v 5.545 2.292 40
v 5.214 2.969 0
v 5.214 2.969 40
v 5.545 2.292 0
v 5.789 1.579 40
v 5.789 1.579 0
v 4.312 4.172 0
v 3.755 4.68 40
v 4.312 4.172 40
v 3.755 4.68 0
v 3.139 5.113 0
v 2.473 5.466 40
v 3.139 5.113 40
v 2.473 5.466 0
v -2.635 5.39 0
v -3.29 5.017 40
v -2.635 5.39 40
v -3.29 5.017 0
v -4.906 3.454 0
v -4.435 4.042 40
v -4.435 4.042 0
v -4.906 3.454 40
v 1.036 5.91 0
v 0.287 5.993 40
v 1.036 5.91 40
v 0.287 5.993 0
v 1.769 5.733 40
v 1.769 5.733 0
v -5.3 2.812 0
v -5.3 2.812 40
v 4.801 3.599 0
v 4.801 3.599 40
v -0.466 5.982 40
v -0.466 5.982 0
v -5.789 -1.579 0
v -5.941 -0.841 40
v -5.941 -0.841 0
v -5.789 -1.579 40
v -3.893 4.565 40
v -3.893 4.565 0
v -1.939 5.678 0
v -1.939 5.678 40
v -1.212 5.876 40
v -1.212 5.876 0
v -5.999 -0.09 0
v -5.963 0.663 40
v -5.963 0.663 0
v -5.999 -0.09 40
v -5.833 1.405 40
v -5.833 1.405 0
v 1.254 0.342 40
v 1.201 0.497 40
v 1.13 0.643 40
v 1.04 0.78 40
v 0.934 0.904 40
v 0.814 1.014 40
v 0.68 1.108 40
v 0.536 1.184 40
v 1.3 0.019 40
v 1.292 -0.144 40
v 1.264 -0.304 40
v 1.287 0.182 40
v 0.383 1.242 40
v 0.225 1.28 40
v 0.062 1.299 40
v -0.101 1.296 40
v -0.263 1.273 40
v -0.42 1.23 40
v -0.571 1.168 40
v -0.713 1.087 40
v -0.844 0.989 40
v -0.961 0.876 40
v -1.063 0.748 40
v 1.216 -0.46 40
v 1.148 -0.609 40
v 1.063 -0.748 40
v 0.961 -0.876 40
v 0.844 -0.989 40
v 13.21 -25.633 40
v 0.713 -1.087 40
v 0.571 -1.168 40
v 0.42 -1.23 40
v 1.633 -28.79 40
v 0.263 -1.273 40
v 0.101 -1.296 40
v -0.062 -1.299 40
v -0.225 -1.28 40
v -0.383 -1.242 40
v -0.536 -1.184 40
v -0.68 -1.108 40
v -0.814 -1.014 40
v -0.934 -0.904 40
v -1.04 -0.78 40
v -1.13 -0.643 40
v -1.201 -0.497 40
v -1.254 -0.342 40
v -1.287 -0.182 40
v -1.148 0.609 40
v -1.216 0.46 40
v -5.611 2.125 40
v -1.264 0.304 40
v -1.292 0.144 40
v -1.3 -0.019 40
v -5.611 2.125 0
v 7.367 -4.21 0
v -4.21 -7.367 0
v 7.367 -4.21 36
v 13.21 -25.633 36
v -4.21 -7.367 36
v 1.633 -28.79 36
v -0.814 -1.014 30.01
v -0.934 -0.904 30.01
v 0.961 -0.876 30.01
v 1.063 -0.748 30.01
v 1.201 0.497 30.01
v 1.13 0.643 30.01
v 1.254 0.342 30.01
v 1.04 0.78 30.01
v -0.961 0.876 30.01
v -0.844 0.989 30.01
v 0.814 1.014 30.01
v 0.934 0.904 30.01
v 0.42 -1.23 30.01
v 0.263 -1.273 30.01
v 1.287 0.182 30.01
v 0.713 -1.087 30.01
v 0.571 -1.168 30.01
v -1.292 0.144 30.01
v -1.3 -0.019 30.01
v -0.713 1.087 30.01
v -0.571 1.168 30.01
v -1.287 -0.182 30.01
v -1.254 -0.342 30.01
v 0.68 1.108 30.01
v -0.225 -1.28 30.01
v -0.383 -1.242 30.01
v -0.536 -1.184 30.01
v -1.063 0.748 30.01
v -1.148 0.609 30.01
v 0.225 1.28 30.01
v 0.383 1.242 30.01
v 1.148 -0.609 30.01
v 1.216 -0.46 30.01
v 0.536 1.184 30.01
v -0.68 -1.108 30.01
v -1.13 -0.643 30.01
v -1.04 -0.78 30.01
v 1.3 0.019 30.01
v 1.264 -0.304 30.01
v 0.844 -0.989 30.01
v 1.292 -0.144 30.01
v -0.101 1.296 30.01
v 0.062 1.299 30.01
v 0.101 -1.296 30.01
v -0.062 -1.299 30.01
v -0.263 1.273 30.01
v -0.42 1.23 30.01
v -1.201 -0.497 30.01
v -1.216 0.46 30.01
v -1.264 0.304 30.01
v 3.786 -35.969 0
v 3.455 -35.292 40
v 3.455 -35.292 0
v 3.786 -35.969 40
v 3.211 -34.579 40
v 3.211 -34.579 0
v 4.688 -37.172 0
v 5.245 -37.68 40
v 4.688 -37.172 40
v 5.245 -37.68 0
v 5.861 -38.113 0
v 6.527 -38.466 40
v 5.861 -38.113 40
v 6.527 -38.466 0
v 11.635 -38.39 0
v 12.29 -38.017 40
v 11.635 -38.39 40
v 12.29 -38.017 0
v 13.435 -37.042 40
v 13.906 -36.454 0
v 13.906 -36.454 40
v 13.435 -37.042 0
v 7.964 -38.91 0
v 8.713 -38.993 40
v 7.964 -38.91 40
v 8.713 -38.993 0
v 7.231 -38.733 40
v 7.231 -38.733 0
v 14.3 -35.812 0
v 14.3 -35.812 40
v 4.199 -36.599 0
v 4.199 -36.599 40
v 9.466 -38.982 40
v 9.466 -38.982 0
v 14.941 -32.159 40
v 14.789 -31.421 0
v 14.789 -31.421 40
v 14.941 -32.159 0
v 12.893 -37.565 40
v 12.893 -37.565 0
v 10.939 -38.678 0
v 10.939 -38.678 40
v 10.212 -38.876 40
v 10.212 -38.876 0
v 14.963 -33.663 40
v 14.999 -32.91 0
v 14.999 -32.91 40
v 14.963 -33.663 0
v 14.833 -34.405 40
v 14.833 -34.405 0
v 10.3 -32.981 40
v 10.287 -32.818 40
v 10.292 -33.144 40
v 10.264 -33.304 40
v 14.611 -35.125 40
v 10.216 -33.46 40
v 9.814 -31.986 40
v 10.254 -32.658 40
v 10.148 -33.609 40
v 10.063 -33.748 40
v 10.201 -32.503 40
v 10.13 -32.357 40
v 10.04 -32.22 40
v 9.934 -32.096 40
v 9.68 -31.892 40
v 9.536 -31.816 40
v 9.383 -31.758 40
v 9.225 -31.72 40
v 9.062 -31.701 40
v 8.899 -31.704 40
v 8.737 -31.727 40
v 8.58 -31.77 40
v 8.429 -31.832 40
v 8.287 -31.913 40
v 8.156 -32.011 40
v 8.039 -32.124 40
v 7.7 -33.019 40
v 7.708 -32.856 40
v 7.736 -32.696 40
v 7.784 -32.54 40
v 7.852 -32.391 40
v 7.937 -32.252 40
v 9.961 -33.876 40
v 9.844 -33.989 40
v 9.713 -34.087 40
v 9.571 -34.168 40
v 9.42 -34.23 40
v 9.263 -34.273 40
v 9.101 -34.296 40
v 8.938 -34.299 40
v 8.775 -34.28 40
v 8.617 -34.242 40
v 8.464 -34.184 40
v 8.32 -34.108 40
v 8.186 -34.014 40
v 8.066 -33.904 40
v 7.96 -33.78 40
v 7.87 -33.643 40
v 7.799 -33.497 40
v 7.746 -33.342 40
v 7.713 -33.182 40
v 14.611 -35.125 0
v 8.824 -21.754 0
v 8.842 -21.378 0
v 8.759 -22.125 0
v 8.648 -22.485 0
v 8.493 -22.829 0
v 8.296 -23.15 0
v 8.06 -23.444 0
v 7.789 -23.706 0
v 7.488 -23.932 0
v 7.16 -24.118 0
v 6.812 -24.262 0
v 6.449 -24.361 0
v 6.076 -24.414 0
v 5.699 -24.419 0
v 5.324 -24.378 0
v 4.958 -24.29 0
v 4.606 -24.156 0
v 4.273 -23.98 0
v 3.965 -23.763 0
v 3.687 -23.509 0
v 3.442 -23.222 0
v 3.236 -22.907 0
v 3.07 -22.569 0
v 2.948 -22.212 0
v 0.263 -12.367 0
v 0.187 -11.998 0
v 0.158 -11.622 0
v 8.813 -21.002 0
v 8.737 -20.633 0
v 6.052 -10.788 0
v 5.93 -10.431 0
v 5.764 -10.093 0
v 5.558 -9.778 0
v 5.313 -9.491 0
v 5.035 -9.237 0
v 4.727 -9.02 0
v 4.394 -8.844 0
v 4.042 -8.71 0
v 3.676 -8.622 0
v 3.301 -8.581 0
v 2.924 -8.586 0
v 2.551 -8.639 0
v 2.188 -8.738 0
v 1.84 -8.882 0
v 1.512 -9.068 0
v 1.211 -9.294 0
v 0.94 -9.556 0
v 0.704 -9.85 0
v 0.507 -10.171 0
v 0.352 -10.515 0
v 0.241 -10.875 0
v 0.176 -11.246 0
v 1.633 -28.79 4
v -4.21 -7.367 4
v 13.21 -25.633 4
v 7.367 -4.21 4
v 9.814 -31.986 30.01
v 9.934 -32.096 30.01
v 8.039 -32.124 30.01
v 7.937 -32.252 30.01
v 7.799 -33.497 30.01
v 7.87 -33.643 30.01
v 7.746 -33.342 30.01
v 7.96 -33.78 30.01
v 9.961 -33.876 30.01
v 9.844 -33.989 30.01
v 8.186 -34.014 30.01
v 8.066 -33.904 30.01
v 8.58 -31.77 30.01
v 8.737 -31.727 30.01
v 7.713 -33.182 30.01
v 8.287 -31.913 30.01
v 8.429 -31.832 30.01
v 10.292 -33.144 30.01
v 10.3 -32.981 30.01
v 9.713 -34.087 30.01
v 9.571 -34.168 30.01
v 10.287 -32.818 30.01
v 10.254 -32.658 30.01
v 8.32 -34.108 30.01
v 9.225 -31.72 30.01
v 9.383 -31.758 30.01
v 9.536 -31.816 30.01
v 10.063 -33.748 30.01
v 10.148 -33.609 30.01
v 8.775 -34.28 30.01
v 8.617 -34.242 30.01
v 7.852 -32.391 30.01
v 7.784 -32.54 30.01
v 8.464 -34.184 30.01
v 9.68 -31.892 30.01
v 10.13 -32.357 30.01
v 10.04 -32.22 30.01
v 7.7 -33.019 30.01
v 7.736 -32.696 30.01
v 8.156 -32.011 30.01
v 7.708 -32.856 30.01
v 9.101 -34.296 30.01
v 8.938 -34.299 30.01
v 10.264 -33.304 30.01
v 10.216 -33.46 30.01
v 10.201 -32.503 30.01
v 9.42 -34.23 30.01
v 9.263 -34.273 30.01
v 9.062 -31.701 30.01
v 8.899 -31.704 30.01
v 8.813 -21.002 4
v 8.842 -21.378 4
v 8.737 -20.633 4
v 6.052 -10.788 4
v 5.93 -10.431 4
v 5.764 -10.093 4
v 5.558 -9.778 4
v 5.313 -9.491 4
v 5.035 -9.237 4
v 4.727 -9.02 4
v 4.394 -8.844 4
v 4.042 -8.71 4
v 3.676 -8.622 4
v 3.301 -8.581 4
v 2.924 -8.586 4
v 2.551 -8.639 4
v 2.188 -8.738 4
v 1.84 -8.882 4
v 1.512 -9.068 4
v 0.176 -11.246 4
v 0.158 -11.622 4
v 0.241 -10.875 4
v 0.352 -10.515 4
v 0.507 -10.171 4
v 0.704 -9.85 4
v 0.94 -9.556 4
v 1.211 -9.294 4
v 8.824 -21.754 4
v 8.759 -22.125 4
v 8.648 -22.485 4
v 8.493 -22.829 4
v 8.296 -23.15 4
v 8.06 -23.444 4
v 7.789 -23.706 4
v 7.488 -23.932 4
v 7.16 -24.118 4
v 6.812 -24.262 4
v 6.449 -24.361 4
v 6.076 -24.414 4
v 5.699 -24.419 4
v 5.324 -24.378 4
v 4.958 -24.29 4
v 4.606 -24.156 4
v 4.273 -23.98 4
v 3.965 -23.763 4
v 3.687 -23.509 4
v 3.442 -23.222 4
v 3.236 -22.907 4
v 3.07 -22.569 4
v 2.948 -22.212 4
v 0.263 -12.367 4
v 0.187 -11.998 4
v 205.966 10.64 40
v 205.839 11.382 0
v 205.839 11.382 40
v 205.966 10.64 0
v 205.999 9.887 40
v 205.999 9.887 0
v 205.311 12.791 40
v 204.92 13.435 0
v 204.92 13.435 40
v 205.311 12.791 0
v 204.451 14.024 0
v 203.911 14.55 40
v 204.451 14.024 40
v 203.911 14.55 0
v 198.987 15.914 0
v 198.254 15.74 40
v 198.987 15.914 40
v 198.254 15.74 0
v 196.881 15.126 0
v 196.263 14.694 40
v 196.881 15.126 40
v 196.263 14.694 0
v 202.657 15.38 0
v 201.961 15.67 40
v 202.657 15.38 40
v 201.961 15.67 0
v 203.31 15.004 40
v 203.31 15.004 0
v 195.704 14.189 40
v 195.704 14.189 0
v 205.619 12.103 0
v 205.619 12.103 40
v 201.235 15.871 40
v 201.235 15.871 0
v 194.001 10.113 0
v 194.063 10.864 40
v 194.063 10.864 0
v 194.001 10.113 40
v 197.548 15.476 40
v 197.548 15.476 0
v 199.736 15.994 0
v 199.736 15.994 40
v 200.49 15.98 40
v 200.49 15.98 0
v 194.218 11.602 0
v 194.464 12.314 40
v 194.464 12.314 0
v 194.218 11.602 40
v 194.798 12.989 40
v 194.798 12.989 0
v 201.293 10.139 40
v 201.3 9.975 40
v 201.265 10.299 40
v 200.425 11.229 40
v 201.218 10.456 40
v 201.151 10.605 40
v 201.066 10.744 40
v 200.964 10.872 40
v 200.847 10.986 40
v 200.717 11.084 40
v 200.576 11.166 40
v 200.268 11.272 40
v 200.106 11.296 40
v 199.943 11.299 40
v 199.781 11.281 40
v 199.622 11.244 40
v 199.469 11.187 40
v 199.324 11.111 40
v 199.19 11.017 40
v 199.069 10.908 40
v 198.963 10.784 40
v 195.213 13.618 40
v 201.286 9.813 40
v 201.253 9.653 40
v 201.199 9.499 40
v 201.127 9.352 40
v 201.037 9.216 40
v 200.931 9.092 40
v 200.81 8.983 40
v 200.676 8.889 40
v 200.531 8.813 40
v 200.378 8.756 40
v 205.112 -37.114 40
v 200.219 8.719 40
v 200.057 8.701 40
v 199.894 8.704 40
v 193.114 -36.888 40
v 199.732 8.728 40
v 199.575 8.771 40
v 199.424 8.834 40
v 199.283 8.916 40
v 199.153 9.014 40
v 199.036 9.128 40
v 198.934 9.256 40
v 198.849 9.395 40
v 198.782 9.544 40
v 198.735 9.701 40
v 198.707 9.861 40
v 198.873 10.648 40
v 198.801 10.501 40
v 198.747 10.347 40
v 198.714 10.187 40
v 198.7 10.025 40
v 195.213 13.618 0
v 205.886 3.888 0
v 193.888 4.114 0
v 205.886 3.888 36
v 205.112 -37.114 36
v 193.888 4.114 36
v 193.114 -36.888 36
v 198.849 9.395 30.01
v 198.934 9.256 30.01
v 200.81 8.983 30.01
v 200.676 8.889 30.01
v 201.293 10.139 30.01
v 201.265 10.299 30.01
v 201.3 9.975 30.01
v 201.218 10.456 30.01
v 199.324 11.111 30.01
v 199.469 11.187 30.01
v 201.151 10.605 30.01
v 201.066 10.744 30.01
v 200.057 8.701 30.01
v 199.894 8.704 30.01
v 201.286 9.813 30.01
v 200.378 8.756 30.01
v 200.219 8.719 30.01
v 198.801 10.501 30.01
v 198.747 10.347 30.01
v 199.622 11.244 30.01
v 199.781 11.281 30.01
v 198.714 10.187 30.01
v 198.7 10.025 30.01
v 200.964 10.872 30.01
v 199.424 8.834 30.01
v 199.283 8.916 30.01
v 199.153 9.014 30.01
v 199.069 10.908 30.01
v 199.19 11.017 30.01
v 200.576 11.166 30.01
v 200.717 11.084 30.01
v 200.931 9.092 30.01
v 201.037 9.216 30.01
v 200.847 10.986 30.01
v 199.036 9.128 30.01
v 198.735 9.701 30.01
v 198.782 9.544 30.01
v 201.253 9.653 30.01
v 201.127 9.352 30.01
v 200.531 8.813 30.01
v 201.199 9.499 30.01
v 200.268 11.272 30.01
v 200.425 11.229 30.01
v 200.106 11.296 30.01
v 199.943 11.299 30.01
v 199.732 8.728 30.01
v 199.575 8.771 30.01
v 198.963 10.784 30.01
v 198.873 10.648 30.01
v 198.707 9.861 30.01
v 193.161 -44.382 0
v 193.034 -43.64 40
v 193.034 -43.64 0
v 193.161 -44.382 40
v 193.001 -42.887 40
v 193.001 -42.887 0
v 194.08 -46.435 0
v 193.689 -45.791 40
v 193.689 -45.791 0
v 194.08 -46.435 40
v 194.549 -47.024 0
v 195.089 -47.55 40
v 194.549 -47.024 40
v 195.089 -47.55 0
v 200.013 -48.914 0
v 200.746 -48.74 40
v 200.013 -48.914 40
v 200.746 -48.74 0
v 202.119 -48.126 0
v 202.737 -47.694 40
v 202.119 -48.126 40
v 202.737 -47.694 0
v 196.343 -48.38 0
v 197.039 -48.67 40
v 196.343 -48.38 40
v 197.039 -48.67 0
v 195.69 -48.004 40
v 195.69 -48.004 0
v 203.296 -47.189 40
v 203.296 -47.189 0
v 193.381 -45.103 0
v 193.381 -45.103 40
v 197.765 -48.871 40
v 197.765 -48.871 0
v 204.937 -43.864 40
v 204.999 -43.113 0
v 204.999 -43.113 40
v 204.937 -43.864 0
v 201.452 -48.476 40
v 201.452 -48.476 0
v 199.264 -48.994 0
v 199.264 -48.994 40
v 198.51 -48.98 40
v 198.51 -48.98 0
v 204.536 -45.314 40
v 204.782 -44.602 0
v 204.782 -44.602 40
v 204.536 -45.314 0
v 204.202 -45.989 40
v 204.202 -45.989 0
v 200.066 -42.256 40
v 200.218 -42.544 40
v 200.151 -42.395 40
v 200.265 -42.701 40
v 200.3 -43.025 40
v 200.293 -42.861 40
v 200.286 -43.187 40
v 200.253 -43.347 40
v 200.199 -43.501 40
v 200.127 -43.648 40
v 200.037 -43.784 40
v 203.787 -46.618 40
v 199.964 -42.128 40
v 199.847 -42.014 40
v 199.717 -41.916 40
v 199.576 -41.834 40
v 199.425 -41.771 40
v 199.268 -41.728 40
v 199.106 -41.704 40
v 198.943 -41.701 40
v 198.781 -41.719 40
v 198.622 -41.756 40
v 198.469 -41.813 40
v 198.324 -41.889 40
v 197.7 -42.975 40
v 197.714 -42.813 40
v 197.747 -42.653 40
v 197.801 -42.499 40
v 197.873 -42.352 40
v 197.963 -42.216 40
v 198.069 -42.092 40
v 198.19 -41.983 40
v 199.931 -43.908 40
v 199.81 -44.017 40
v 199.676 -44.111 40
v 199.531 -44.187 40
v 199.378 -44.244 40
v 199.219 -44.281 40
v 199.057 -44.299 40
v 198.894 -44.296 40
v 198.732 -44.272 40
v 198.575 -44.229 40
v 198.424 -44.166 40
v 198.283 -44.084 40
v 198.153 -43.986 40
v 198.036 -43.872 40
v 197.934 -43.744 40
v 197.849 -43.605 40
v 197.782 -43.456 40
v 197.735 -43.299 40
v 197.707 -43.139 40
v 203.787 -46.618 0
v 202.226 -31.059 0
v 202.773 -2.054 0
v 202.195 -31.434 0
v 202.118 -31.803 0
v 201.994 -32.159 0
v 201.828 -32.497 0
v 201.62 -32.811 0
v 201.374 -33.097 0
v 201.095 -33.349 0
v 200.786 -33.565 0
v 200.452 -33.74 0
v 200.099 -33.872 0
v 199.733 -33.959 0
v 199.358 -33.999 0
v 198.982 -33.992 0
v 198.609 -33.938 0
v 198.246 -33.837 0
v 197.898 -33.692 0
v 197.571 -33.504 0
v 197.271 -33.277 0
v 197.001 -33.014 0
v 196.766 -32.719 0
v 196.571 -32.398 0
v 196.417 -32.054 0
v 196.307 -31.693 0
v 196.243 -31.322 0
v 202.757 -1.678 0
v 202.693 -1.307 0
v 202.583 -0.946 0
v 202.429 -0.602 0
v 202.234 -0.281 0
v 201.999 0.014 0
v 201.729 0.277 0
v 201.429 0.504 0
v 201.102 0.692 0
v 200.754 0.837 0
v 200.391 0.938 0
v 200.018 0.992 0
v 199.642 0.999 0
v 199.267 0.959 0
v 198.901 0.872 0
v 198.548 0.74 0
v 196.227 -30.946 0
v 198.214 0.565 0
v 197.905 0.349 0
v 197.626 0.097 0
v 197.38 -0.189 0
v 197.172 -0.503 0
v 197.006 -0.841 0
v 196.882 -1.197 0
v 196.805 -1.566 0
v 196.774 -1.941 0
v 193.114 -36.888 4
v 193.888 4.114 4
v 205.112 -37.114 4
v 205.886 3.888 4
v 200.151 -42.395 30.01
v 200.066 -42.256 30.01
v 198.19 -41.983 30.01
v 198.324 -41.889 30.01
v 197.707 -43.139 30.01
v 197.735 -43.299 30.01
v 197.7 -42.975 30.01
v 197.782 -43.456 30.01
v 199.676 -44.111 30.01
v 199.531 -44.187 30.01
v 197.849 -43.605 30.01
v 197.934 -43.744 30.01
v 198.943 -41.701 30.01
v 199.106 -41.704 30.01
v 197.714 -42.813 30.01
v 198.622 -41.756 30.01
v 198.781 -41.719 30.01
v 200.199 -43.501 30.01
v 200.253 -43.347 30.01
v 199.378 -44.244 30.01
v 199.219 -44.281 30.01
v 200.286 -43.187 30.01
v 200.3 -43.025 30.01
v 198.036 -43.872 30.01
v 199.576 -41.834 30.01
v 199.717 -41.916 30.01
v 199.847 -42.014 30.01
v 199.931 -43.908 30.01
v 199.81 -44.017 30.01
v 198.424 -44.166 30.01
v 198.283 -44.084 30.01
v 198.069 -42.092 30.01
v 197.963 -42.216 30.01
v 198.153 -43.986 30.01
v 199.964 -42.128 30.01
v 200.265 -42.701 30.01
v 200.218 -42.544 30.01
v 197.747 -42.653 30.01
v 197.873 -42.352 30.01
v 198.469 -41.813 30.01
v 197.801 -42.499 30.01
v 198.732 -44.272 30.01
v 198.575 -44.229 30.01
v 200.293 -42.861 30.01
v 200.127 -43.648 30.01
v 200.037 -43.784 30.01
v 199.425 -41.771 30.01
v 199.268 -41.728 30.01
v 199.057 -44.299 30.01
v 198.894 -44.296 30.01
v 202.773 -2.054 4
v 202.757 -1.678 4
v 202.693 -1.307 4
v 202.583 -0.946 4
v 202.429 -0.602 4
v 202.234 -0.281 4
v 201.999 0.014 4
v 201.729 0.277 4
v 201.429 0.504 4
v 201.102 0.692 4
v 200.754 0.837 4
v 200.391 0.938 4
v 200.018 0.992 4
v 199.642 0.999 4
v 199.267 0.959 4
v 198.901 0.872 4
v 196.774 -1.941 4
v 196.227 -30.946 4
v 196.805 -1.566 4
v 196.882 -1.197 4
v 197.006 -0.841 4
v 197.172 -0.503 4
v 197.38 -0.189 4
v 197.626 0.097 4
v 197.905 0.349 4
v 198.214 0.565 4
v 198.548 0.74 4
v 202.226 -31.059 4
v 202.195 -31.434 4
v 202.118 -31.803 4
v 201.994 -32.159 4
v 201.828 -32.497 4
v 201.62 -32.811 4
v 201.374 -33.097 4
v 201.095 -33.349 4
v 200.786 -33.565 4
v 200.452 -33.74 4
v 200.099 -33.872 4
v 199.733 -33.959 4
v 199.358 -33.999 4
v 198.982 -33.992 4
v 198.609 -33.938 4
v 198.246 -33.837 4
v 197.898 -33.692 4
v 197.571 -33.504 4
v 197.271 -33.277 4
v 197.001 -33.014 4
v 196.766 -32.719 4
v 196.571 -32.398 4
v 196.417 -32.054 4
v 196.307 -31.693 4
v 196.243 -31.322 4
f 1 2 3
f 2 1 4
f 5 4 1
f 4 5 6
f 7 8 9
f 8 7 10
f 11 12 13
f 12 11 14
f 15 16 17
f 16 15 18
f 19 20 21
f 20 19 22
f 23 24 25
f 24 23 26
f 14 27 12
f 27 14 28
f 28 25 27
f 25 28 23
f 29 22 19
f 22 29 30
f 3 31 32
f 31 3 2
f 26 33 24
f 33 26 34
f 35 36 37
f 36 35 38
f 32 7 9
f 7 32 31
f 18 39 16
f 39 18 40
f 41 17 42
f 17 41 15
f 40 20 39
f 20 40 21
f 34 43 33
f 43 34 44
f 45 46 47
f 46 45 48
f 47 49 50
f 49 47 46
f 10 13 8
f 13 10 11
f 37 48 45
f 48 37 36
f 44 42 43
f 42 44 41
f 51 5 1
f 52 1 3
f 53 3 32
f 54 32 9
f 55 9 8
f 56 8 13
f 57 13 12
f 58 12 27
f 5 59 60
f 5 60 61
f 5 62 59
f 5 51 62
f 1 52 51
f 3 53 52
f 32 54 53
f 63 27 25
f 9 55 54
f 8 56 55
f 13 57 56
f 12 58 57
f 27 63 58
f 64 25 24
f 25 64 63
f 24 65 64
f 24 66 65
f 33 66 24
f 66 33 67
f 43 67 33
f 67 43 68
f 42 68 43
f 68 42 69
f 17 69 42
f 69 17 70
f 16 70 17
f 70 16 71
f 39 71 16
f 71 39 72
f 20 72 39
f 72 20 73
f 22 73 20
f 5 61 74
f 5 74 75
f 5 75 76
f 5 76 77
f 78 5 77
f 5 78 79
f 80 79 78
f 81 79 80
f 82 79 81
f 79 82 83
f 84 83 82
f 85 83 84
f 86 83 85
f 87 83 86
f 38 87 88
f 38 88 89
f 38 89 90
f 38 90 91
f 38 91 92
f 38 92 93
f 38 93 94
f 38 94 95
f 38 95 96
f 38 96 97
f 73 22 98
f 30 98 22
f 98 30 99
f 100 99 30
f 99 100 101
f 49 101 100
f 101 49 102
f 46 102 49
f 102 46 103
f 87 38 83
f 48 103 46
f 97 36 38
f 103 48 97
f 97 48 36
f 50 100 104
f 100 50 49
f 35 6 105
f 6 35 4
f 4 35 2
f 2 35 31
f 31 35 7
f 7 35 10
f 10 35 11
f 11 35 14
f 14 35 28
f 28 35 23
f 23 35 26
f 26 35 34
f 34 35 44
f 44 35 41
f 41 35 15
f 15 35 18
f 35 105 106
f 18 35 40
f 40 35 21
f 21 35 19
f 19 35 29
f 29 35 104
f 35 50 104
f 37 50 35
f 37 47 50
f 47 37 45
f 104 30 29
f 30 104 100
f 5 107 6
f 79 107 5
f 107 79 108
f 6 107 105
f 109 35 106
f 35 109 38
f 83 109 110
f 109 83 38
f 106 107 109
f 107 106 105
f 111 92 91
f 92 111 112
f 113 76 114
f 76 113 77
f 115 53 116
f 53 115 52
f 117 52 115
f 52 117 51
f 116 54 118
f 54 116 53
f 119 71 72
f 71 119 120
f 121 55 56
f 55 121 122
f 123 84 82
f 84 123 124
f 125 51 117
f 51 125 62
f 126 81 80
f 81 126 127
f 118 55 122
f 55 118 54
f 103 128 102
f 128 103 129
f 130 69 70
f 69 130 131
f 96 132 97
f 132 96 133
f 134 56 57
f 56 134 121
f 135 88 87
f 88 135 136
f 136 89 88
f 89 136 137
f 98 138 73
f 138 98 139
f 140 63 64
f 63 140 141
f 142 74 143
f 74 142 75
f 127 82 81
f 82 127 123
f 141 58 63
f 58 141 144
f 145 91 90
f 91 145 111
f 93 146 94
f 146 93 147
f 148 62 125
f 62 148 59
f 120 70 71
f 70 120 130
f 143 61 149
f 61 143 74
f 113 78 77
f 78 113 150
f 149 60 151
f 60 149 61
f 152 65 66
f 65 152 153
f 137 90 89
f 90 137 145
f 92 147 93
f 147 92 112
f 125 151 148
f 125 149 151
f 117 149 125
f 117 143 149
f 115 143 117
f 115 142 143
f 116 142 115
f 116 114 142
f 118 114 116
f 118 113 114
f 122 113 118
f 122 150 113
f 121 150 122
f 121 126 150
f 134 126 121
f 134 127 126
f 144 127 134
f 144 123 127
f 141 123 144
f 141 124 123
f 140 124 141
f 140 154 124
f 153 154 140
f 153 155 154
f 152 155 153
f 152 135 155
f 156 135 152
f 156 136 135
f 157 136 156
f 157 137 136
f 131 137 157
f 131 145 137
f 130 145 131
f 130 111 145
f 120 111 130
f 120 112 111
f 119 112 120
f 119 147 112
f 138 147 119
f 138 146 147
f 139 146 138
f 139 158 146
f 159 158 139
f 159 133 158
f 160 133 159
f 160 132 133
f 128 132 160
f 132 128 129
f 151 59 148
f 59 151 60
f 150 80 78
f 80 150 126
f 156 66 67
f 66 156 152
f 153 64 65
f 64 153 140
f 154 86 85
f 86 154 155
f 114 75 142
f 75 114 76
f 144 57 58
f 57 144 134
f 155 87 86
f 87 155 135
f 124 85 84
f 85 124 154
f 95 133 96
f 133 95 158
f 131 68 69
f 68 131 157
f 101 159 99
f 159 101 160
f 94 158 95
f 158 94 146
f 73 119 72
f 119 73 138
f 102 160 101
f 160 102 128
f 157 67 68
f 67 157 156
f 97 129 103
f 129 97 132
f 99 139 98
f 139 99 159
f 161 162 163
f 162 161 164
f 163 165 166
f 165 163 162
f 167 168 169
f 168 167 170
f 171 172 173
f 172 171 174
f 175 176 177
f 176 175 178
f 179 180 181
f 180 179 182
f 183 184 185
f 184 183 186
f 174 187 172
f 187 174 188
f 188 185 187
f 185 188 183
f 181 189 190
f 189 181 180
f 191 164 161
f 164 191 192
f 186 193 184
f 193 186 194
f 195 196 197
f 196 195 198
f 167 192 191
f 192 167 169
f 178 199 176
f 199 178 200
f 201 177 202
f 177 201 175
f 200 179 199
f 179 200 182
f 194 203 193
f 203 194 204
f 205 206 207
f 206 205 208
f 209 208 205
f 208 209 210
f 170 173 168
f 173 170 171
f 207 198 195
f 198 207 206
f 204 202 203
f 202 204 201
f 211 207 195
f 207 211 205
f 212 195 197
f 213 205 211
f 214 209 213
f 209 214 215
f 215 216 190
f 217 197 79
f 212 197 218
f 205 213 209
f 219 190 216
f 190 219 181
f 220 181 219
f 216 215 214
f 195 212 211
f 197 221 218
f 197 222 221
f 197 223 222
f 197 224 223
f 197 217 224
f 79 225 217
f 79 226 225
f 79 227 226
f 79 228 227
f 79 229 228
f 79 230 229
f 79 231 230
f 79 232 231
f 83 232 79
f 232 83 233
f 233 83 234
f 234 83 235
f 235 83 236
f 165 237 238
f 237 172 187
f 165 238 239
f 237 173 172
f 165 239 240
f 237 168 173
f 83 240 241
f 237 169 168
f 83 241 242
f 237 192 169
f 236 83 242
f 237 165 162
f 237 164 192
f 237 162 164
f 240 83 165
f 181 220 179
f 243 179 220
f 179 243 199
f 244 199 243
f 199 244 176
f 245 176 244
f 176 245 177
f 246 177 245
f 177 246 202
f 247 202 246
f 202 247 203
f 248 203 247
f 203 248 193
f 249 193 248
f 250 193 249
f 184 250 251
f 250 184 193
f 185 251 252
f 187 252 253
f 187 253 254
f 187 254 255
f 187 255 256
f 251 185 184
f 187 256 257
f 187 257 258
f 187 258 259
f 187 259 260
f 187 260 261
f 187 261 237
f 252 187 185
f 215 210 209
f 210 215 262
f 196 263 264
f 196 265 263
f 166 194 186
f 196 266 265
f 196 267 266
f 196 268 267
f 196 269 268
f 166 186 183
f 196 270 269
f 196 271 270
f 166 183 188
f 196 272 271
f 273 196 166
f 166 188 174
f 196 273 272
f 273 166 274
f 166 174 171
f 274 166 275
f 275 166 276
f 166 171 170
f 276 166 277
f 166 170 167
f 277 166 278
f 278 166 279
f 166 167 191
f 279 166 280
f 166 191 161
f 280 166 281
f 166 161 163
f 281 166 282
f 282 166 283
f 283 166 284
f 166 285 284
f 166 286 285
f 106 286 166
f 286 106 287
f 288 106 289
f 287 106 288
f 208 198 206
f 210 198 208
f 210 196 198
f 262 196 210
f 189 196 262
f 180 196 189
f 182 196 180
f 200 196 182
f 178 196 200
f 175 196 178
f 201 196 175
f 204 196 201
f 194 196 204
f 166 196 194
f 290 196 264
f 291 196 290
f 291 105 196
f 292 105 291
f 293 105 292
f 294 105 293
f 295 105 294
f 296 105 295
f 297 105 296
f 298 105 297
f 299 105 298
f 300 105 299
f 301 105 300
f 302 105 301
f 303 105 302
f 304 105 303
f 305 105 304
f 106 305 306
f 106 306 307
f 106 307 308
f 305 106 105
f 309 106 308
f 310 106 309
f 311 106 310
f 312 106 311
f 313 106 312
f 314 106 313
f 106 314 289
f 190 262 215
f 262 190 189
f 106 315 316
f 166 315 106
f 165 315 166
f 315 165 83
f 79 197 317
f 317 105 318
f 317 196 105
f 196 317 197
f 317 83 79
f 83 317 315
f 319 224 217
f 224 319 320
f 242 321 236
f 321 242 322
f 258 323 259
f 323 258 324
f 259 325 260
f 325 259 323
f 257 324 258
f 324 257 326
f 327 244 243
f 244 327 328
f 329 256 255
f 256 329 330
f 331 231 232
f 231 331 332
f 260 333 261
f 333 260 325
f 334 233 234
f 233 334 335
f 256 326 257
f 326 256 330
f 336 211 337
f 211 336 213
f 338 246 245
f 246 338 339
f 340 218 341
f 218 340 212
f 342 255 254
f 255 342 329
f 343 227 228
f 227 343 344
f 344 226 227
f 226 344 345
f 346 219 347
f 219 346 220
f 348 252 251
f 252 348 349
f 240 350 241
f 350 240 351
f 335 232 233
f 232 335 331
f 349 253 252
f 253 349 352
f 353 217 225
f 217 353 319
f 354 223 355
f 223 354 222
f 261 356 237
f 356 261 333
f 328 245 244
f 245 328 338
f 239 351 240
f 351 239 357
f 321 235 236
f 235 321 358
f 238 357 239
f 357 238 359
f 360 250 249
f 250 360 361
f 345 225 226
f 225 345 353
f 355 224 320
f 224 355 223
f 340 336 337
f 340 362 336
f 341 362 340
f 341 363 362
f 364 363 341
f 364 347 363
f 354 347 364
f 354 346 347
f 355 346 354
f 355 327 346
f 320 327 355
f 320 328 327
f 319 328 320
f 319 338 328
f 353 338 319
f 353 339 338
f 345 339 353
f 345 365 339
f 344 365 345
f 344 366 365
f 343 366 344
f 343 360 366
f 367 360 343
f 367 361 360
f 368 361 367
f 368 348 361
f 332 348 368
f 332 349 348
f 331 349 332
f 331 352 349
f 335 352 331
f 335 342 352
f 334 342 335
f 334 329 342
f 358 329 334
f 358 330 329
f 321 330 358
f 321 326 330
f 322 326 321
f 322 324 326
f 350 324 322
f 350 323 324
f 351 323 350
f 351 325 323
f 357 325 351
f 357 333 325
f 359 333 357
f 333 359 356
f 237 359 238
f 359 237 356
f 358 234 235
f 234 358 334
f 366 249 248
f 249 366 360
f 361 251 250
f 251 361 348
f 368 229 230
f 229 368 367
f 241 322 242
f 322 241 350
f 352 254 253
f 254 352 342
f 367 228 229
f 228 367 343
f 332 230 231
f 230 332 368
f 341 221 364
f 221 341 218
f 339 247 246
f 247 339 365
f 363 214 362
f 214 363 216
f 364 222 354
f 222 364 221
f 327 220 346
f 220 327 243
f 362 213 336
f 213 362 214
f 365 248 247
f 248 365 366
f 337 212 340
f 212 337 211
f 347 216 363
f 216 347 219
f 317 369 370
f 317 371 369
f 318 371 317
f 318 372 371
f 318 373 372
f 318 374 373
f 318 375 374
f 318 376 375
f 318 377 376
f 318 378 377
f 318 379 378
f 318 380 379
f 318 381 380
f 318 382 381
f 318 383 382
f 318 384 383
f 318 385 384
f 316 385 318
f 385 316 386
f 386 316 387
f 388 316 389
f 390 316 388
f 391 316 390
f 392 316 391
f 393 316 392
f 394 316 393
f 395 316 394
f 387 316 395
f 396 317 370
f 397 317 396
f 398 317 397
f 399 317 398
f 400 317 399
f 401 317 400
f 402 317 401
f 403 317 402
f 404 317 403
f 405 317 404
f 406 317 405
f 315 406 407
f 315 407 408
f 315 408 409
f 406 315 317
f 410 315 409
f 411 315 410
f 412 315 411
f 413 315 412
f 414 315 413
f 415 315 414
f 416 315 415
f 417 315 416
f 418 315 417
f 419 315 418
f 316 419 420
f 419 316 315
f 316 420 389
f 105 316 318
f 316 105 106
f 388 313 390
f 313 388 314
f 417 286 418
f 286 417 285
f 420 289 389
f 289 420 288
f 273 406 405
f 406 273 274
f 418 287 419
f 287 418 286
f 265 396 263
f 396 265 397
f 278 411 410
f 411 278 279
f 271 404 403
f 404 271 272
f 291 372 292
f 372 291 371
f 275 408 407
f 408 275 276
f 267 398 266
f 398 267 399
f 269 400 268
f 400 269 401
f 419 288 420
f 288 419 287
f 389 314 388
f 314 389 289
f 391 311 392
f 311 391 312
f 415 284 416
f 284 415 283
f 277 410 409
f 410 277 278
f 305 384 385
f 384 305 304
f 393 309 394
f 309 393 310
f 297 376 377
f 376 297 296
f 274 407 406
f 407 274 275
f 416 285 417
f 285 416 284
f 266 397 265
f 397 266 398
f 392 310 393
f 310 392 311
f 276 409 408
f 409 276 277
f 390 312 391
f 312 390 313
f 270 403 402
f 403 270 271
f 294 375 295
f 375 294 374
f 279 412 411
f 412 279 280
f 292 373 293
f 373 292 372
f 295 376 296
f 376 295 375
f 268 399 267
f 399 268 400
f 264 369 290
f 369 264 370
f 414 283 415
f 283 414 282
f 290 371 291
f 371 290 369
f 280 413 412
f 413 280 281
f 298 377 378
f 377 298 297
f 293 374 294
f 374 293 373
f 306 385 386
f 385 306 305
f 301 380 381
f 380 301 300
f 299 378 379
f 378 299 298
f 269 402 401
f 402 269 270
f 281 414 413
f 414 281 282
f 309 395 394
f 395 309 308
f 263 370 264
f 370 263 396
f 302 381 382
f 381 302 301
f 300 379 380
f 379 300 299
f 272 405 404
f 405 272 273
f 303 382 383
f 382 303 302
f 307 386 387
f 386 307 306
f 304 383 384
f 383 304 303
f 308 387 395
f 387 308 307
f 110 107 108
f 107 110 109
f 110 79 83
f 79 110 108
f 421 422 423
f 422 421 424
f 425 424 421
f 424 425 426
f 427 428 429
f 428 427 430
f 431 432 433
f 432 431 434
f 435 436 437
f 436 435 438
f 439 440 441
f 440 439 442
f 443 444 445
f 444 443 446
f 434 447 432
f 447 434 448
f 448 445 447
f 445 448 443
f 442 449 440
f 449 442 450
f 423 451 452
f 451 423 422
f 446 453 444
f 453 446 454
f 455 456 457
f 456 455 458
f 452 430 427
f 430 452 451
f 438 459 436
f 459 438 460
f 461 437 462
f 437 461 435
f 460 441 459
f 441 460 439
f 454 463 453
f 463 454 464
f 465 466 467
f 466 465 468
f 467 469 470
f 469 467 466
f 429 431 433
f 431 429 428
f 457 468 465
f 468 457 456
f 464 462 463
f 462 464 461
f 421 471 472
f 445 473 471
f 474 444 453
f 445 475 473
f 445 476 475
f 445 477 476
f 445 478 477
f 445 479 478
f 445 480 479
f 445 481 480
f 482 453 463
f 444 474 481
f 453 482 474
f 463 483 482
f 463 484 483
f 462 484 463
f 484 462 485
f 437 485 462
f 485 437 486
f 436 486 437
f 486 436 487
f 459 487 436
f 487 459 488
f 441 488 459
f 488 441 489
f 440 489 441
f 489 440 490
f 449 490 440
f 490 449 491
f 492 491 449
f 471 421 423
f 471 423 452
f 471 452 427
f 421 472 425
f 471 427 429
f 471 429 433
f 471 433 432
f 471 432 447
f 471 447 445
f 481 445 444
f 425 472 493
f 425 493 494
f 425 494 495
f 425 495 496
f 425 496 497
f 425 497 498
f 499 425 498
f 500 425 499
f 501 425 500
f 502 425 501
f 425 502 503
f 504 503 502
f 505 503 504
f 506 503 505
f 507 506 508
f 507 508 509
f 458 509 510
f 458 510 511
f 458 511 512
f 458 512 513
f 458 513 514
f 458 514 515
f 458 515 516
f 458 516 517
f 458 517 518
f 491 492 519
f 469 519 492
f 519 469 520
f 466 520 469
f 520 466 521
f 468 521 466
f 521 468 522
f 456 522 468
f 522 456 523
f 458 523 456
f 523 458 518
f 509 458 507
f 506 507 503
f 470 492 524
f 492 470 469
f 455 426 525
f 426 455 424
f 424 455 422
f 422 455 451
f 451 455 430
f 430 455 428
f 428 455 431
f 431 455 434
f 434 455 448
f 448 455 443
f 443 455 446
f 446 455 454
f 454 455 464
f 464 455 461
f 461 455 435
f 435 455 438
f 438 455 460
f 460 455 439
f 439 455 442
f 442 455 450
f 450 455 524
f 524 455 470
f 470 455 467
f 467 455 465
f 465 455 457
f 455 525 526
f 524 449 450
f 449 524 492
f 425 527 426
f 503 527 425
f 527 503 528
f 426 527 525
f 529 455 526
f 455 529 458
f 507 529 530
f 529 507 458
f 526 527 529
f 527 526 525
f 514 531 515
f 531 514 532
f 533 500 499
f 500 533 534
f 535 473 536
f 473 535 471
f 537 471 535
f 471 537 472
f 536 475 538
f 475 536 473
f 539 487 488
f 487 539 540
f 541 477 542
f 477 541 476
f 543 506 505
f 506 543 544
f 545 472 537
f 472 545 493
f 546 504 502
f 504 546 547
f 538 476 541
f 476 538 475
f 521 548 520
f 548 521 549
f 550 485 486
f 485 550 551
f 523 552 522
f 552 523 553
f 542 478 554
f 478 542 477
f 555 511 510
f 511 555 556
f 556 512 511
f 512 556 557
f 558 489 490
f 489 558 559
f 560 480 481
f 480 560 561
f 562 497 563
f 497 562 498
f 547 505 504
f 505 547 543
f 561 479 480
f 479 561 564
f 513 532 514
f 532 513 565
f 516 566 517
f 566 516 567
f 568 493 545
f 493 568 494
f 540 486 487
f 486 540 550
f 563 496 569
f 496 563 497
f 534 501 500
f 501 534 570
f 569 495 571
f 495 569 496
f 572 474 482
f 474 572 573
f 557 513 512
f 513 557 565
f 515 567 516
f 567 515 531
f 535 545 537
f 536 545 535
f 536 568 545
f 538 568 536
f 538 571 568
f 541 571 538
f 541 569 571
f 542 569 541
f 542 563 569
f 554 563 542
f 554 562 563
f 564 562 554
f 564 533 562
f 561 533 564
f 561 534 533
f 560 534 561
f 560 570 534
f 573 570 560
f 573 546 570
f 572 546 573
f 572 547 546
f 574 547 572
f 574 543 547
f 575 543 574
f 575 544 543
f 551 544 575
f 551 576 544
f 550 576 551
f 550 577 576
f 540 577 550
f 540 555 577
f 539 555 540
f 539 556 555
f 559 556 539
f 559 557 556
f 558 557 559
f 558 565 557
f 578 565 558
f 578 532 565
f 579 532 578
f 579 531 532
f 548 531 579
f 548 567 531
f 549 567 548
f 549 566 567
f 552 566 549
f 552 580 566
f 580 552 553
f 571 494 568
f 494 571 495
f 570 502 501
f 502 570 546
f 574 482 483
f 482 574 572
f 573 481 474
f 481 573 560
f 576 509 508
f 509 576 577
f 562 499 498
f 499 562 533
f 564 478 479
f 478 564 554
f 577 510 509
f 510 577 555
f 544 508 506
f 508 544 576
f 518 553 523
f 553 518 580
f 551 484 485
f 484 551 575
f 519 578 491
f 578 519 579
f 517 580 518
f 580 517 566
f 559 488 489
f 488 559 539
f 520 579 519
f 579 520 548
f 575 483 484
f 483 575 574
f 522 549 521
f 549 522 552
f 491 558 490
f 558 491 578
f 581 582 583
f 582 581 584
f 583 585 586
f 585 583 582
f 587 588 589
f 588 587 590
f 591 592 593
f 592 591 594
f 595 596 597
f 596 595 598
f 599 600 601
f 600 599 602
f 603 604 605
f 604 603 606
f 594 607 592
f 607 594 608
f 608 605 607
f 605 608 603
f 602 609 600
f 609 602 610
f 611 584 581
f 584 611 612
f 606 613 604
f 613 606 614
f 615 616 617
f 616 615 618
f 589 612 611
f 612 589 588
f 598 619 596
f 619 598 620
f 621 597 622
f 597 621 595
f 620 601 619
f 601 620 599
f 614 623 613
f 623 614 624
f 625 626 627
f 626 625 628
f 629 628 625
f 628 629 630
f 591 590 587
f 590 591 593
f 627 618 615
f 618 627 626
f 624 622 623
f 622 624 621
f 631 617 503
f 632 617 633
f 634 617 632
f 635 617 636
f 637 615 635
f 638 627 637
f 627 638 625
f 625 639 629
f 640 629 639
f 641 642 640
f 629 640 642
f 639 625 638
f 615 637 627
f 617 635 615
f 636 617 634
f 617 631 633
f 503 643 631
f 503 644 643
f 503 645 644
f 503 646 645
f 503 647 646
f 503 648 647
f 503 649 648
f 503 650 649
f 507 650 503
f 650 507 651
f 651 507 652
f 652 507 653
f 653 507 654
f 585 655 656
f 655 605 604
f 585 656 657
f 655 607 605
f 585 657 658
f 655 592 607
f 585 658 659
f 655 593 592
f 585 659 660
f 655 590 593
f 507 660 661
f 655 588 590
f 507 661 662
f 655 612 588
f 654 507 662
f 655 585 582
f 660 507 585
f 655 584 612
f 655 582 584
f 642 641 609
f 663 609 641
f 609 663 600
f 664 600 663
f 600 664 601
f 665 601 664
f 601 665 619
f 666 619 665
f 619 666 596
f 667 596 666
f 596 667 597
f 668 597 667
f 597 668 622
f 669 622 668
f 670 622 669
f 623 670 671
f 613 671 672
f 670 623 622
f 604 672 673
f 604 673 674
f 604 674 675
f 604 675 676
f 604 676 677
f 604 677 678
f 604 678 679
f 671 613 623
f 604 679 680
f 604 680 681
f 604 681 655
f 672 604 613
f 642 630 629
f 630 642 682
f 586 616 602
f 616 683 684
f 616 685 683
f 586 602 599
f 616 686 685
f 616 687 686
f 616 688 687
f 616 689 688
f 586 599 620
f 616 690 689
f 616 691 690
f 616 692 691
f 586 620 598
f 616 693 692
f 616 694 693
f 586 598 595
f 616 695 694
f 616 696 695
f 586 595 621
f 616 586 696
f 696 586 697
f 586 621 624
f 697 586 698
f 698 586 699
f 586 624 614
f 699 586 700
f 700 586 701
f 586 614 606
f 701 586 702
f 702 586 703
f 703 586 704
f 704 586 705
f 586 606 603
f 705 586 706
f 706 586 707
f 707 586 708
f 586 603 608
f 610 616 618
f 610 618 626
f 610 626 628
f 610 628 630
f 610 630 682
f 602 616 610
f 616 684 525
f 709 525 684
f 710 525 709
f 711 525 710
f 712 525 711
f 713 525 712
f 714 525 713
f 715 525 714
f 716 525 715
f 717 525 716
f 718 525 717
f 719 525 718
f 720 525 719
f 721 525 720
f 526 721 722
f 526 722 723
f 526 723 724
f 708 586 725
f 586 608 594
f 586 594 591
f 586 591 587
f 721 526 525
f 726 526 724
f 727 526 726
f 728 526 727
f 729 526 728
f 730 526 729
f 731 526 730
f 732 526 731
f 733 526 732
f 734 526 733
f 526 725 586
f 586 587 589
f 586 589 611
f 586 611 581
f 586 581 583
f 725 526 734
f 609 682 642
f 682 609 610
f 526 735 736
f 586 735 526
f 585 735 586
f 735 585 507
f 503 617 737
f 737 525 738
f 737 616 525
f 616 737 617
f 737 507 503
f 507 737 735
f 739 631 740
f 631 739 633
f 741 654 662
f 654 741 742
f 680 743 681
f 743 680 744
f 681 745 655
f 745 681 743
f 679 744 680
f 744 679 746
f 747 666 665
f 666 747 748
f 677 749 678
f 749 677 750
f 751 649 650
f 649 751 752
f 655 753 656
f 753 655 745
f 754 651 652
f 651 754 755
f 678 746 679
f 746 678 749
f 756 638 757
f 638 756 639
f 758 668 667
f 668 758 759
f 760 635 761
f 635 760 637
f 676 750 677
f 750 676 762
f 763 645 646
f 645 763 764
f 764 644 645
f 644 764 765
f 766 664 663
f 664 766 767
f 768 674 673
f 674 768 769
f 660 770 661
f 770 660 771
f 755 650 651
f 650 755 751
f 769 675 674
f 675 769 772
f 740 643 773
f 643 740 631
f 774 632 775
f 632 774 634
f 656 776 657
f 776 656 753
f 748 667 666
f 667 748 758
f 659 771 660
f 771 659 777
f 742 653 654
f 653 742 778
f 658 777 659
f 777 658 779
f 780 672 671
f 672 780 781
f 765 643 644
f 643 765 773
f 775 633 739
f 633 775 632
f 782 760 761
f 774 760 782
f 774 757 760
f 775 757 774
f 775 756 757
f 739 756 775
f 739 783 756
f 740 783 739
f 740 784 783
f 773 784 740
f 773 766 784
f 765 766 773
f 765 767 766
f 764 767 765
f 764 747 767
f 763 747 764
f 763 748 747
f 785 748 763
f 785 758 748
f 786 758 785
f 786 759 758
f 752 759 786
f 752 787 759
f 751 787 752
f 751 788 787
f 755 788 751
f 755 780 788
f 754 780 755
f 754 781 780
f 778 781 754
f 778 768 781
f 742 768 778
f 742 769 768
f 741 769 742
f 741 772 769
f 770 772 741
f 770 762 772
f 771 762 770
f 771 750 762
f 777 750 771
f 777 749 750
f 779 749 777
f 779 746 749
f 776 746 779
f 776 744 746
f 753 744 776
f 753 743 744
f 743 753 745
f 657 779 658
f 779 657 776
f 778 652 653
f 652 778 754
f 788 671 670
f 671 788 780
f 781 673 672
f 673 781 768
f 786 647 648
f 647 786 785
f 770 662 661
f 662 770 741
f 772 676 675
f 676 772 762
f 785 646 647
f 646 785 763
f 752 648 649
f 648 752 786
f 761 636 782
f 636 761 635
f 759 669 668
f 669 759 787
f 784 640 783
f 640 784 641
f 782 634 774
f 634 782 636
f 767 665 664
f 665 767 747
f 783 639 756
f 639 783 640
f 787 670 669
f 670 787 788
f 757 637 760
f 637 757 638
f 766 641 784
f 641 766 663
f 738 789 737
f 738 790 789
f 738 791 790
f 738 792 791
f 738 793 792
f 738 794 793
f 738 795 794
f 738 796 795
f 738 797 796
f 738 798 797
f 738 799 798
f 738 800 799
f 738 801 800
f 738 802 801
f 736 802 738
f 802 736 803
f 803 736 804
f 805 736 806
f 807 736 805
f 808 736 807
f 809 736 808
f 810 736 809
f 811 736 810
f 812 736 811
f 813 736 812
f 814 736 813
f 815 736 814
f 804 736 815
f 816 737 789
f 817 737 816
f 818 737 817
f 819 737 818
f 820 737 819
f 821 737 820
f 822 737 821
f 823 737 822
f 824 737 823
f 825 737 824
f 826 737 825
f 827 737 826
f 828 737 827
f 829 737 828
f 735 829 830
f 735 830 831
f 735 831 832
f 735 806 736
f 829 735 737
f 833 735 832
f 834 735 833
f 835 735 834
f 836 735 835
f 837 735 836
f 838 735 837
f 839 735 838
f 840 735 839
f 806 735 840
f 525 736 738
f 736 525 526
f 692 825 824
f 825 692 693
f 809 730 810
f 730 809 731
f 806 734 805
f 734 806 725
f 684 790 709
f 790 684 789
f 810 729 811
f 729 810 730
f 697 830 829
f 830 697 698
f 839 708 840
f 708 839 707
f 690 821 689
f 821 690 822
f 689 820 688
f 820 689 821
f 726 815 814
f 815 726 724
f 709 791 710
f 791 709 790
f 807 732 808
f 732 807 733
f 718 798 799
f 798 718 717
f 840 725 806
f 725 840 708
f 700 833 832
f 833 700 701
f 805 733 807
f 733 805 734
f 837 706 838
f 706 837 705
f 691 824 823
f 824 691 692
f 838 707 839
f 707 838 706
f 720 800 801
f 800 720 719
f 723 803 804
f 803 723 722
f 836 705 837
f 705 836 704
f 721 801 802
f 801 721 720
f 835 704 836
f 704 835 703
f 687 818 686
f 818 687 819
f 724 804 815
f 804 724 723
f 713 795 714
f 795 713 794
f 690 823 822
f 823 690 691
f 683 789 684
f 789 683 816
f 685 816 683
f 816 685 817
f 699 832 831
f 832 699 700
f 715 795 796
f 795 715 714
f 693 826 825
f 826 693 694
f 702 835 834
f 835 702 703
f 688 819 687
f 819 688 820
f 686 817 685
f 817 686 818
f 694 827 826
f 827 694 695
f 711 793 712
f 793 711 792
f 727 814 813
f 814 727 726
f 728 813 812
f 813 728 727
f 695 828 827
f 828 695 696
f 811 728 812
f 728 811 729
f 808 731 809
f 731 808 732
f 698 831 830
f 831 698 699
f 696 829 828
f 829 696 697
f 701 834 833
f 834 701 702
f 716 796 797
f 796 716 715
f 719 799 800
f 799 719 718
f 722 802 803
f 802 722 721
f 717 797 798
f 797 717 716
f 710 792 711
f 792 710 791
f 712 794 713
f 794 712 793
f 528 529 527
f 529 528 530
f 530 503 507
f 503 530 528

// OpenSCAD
$fn=50;

PART="BOTH";
//PART="LEFT";
//PART="RIGHT";

// delta for top holes
TOP_DX = 200;
TOP_DY = 10;

// delta for right holes
RIGHT_DX = -1;
RIGHT_DY = 53;

// delta for left holes
LEFT_DX = 9;
LEFT_DY = 33;

HOLE_RADIUS = 2.5;
HEIGHT = 40;
TAP_RADIUS = 1.3;
TAP_HEIGHT = 10;

module column(height=40, width = 12) {

  difference() {
    union() {
      cylinder(h = height, r = width/2);
      translate([-width/2, -width/2, 0])
      cube([width, width/2, height]);
    }
    // tap hole
    translate([0, 0, height - TAP_HEIGHT + 0.01])
    cylinder(h = TAP_HEIGHT, r = TAP_RADIUS);
  }
}

module support(length=10, width=12) {
  
  t = 4 ; // 3mm thickness
  cr = 3; // cutout radius
  
  // columns
  column();
  rotate([0, 0, 180])
  translate([0, length, 0])
  column();
  
  l = length - width;
  // bottom
  translate([-width/2, -l - width /2 , 0]) {
    difference() {
      cube([width, l, t]);
        // cutout
      hull() {
        translate([width/2, width/2, -0.01])
        cylinder(h=t+0.02, r=cr);
        translate([width/2, l - width/2, -0.01])
        cylinder(h=t+0.02, r=cr);
      }
    }
  }
  // top
  translate([-width/2, -l - width / 2, HEIGHT - t])
  cube([width, l, t]);  
 
}

LEFT_ROTATE = atan(LEFT_DX / LEFT_DY);
LEFT_LEN = sqrt(LEFT_DX ^ 2 + LEFT_DY ^ 2);
RIGHT_ROTATE = atan(RIGHT_DX / RIGHT_DY);
RIGHT_LEN = sqrt(RIGHT_DX ^ 2 + RIGHT_DY ^ 2);

if(PART=="BOTH") {
  rotate([0, 0, LEFT_ROTATE])
  support(length = LEFT_LEN);

  translate([TOP_DX, TOP_DY, 0])
  rotate([0, 0, RIGHT_ROTATE])
  support(length = RIGHT_LEN);
}

if(PART=="LEFT") support(length = LEFT_LEN);
if(PART=="RIGHT") support(length = RIGHT_LEN);
